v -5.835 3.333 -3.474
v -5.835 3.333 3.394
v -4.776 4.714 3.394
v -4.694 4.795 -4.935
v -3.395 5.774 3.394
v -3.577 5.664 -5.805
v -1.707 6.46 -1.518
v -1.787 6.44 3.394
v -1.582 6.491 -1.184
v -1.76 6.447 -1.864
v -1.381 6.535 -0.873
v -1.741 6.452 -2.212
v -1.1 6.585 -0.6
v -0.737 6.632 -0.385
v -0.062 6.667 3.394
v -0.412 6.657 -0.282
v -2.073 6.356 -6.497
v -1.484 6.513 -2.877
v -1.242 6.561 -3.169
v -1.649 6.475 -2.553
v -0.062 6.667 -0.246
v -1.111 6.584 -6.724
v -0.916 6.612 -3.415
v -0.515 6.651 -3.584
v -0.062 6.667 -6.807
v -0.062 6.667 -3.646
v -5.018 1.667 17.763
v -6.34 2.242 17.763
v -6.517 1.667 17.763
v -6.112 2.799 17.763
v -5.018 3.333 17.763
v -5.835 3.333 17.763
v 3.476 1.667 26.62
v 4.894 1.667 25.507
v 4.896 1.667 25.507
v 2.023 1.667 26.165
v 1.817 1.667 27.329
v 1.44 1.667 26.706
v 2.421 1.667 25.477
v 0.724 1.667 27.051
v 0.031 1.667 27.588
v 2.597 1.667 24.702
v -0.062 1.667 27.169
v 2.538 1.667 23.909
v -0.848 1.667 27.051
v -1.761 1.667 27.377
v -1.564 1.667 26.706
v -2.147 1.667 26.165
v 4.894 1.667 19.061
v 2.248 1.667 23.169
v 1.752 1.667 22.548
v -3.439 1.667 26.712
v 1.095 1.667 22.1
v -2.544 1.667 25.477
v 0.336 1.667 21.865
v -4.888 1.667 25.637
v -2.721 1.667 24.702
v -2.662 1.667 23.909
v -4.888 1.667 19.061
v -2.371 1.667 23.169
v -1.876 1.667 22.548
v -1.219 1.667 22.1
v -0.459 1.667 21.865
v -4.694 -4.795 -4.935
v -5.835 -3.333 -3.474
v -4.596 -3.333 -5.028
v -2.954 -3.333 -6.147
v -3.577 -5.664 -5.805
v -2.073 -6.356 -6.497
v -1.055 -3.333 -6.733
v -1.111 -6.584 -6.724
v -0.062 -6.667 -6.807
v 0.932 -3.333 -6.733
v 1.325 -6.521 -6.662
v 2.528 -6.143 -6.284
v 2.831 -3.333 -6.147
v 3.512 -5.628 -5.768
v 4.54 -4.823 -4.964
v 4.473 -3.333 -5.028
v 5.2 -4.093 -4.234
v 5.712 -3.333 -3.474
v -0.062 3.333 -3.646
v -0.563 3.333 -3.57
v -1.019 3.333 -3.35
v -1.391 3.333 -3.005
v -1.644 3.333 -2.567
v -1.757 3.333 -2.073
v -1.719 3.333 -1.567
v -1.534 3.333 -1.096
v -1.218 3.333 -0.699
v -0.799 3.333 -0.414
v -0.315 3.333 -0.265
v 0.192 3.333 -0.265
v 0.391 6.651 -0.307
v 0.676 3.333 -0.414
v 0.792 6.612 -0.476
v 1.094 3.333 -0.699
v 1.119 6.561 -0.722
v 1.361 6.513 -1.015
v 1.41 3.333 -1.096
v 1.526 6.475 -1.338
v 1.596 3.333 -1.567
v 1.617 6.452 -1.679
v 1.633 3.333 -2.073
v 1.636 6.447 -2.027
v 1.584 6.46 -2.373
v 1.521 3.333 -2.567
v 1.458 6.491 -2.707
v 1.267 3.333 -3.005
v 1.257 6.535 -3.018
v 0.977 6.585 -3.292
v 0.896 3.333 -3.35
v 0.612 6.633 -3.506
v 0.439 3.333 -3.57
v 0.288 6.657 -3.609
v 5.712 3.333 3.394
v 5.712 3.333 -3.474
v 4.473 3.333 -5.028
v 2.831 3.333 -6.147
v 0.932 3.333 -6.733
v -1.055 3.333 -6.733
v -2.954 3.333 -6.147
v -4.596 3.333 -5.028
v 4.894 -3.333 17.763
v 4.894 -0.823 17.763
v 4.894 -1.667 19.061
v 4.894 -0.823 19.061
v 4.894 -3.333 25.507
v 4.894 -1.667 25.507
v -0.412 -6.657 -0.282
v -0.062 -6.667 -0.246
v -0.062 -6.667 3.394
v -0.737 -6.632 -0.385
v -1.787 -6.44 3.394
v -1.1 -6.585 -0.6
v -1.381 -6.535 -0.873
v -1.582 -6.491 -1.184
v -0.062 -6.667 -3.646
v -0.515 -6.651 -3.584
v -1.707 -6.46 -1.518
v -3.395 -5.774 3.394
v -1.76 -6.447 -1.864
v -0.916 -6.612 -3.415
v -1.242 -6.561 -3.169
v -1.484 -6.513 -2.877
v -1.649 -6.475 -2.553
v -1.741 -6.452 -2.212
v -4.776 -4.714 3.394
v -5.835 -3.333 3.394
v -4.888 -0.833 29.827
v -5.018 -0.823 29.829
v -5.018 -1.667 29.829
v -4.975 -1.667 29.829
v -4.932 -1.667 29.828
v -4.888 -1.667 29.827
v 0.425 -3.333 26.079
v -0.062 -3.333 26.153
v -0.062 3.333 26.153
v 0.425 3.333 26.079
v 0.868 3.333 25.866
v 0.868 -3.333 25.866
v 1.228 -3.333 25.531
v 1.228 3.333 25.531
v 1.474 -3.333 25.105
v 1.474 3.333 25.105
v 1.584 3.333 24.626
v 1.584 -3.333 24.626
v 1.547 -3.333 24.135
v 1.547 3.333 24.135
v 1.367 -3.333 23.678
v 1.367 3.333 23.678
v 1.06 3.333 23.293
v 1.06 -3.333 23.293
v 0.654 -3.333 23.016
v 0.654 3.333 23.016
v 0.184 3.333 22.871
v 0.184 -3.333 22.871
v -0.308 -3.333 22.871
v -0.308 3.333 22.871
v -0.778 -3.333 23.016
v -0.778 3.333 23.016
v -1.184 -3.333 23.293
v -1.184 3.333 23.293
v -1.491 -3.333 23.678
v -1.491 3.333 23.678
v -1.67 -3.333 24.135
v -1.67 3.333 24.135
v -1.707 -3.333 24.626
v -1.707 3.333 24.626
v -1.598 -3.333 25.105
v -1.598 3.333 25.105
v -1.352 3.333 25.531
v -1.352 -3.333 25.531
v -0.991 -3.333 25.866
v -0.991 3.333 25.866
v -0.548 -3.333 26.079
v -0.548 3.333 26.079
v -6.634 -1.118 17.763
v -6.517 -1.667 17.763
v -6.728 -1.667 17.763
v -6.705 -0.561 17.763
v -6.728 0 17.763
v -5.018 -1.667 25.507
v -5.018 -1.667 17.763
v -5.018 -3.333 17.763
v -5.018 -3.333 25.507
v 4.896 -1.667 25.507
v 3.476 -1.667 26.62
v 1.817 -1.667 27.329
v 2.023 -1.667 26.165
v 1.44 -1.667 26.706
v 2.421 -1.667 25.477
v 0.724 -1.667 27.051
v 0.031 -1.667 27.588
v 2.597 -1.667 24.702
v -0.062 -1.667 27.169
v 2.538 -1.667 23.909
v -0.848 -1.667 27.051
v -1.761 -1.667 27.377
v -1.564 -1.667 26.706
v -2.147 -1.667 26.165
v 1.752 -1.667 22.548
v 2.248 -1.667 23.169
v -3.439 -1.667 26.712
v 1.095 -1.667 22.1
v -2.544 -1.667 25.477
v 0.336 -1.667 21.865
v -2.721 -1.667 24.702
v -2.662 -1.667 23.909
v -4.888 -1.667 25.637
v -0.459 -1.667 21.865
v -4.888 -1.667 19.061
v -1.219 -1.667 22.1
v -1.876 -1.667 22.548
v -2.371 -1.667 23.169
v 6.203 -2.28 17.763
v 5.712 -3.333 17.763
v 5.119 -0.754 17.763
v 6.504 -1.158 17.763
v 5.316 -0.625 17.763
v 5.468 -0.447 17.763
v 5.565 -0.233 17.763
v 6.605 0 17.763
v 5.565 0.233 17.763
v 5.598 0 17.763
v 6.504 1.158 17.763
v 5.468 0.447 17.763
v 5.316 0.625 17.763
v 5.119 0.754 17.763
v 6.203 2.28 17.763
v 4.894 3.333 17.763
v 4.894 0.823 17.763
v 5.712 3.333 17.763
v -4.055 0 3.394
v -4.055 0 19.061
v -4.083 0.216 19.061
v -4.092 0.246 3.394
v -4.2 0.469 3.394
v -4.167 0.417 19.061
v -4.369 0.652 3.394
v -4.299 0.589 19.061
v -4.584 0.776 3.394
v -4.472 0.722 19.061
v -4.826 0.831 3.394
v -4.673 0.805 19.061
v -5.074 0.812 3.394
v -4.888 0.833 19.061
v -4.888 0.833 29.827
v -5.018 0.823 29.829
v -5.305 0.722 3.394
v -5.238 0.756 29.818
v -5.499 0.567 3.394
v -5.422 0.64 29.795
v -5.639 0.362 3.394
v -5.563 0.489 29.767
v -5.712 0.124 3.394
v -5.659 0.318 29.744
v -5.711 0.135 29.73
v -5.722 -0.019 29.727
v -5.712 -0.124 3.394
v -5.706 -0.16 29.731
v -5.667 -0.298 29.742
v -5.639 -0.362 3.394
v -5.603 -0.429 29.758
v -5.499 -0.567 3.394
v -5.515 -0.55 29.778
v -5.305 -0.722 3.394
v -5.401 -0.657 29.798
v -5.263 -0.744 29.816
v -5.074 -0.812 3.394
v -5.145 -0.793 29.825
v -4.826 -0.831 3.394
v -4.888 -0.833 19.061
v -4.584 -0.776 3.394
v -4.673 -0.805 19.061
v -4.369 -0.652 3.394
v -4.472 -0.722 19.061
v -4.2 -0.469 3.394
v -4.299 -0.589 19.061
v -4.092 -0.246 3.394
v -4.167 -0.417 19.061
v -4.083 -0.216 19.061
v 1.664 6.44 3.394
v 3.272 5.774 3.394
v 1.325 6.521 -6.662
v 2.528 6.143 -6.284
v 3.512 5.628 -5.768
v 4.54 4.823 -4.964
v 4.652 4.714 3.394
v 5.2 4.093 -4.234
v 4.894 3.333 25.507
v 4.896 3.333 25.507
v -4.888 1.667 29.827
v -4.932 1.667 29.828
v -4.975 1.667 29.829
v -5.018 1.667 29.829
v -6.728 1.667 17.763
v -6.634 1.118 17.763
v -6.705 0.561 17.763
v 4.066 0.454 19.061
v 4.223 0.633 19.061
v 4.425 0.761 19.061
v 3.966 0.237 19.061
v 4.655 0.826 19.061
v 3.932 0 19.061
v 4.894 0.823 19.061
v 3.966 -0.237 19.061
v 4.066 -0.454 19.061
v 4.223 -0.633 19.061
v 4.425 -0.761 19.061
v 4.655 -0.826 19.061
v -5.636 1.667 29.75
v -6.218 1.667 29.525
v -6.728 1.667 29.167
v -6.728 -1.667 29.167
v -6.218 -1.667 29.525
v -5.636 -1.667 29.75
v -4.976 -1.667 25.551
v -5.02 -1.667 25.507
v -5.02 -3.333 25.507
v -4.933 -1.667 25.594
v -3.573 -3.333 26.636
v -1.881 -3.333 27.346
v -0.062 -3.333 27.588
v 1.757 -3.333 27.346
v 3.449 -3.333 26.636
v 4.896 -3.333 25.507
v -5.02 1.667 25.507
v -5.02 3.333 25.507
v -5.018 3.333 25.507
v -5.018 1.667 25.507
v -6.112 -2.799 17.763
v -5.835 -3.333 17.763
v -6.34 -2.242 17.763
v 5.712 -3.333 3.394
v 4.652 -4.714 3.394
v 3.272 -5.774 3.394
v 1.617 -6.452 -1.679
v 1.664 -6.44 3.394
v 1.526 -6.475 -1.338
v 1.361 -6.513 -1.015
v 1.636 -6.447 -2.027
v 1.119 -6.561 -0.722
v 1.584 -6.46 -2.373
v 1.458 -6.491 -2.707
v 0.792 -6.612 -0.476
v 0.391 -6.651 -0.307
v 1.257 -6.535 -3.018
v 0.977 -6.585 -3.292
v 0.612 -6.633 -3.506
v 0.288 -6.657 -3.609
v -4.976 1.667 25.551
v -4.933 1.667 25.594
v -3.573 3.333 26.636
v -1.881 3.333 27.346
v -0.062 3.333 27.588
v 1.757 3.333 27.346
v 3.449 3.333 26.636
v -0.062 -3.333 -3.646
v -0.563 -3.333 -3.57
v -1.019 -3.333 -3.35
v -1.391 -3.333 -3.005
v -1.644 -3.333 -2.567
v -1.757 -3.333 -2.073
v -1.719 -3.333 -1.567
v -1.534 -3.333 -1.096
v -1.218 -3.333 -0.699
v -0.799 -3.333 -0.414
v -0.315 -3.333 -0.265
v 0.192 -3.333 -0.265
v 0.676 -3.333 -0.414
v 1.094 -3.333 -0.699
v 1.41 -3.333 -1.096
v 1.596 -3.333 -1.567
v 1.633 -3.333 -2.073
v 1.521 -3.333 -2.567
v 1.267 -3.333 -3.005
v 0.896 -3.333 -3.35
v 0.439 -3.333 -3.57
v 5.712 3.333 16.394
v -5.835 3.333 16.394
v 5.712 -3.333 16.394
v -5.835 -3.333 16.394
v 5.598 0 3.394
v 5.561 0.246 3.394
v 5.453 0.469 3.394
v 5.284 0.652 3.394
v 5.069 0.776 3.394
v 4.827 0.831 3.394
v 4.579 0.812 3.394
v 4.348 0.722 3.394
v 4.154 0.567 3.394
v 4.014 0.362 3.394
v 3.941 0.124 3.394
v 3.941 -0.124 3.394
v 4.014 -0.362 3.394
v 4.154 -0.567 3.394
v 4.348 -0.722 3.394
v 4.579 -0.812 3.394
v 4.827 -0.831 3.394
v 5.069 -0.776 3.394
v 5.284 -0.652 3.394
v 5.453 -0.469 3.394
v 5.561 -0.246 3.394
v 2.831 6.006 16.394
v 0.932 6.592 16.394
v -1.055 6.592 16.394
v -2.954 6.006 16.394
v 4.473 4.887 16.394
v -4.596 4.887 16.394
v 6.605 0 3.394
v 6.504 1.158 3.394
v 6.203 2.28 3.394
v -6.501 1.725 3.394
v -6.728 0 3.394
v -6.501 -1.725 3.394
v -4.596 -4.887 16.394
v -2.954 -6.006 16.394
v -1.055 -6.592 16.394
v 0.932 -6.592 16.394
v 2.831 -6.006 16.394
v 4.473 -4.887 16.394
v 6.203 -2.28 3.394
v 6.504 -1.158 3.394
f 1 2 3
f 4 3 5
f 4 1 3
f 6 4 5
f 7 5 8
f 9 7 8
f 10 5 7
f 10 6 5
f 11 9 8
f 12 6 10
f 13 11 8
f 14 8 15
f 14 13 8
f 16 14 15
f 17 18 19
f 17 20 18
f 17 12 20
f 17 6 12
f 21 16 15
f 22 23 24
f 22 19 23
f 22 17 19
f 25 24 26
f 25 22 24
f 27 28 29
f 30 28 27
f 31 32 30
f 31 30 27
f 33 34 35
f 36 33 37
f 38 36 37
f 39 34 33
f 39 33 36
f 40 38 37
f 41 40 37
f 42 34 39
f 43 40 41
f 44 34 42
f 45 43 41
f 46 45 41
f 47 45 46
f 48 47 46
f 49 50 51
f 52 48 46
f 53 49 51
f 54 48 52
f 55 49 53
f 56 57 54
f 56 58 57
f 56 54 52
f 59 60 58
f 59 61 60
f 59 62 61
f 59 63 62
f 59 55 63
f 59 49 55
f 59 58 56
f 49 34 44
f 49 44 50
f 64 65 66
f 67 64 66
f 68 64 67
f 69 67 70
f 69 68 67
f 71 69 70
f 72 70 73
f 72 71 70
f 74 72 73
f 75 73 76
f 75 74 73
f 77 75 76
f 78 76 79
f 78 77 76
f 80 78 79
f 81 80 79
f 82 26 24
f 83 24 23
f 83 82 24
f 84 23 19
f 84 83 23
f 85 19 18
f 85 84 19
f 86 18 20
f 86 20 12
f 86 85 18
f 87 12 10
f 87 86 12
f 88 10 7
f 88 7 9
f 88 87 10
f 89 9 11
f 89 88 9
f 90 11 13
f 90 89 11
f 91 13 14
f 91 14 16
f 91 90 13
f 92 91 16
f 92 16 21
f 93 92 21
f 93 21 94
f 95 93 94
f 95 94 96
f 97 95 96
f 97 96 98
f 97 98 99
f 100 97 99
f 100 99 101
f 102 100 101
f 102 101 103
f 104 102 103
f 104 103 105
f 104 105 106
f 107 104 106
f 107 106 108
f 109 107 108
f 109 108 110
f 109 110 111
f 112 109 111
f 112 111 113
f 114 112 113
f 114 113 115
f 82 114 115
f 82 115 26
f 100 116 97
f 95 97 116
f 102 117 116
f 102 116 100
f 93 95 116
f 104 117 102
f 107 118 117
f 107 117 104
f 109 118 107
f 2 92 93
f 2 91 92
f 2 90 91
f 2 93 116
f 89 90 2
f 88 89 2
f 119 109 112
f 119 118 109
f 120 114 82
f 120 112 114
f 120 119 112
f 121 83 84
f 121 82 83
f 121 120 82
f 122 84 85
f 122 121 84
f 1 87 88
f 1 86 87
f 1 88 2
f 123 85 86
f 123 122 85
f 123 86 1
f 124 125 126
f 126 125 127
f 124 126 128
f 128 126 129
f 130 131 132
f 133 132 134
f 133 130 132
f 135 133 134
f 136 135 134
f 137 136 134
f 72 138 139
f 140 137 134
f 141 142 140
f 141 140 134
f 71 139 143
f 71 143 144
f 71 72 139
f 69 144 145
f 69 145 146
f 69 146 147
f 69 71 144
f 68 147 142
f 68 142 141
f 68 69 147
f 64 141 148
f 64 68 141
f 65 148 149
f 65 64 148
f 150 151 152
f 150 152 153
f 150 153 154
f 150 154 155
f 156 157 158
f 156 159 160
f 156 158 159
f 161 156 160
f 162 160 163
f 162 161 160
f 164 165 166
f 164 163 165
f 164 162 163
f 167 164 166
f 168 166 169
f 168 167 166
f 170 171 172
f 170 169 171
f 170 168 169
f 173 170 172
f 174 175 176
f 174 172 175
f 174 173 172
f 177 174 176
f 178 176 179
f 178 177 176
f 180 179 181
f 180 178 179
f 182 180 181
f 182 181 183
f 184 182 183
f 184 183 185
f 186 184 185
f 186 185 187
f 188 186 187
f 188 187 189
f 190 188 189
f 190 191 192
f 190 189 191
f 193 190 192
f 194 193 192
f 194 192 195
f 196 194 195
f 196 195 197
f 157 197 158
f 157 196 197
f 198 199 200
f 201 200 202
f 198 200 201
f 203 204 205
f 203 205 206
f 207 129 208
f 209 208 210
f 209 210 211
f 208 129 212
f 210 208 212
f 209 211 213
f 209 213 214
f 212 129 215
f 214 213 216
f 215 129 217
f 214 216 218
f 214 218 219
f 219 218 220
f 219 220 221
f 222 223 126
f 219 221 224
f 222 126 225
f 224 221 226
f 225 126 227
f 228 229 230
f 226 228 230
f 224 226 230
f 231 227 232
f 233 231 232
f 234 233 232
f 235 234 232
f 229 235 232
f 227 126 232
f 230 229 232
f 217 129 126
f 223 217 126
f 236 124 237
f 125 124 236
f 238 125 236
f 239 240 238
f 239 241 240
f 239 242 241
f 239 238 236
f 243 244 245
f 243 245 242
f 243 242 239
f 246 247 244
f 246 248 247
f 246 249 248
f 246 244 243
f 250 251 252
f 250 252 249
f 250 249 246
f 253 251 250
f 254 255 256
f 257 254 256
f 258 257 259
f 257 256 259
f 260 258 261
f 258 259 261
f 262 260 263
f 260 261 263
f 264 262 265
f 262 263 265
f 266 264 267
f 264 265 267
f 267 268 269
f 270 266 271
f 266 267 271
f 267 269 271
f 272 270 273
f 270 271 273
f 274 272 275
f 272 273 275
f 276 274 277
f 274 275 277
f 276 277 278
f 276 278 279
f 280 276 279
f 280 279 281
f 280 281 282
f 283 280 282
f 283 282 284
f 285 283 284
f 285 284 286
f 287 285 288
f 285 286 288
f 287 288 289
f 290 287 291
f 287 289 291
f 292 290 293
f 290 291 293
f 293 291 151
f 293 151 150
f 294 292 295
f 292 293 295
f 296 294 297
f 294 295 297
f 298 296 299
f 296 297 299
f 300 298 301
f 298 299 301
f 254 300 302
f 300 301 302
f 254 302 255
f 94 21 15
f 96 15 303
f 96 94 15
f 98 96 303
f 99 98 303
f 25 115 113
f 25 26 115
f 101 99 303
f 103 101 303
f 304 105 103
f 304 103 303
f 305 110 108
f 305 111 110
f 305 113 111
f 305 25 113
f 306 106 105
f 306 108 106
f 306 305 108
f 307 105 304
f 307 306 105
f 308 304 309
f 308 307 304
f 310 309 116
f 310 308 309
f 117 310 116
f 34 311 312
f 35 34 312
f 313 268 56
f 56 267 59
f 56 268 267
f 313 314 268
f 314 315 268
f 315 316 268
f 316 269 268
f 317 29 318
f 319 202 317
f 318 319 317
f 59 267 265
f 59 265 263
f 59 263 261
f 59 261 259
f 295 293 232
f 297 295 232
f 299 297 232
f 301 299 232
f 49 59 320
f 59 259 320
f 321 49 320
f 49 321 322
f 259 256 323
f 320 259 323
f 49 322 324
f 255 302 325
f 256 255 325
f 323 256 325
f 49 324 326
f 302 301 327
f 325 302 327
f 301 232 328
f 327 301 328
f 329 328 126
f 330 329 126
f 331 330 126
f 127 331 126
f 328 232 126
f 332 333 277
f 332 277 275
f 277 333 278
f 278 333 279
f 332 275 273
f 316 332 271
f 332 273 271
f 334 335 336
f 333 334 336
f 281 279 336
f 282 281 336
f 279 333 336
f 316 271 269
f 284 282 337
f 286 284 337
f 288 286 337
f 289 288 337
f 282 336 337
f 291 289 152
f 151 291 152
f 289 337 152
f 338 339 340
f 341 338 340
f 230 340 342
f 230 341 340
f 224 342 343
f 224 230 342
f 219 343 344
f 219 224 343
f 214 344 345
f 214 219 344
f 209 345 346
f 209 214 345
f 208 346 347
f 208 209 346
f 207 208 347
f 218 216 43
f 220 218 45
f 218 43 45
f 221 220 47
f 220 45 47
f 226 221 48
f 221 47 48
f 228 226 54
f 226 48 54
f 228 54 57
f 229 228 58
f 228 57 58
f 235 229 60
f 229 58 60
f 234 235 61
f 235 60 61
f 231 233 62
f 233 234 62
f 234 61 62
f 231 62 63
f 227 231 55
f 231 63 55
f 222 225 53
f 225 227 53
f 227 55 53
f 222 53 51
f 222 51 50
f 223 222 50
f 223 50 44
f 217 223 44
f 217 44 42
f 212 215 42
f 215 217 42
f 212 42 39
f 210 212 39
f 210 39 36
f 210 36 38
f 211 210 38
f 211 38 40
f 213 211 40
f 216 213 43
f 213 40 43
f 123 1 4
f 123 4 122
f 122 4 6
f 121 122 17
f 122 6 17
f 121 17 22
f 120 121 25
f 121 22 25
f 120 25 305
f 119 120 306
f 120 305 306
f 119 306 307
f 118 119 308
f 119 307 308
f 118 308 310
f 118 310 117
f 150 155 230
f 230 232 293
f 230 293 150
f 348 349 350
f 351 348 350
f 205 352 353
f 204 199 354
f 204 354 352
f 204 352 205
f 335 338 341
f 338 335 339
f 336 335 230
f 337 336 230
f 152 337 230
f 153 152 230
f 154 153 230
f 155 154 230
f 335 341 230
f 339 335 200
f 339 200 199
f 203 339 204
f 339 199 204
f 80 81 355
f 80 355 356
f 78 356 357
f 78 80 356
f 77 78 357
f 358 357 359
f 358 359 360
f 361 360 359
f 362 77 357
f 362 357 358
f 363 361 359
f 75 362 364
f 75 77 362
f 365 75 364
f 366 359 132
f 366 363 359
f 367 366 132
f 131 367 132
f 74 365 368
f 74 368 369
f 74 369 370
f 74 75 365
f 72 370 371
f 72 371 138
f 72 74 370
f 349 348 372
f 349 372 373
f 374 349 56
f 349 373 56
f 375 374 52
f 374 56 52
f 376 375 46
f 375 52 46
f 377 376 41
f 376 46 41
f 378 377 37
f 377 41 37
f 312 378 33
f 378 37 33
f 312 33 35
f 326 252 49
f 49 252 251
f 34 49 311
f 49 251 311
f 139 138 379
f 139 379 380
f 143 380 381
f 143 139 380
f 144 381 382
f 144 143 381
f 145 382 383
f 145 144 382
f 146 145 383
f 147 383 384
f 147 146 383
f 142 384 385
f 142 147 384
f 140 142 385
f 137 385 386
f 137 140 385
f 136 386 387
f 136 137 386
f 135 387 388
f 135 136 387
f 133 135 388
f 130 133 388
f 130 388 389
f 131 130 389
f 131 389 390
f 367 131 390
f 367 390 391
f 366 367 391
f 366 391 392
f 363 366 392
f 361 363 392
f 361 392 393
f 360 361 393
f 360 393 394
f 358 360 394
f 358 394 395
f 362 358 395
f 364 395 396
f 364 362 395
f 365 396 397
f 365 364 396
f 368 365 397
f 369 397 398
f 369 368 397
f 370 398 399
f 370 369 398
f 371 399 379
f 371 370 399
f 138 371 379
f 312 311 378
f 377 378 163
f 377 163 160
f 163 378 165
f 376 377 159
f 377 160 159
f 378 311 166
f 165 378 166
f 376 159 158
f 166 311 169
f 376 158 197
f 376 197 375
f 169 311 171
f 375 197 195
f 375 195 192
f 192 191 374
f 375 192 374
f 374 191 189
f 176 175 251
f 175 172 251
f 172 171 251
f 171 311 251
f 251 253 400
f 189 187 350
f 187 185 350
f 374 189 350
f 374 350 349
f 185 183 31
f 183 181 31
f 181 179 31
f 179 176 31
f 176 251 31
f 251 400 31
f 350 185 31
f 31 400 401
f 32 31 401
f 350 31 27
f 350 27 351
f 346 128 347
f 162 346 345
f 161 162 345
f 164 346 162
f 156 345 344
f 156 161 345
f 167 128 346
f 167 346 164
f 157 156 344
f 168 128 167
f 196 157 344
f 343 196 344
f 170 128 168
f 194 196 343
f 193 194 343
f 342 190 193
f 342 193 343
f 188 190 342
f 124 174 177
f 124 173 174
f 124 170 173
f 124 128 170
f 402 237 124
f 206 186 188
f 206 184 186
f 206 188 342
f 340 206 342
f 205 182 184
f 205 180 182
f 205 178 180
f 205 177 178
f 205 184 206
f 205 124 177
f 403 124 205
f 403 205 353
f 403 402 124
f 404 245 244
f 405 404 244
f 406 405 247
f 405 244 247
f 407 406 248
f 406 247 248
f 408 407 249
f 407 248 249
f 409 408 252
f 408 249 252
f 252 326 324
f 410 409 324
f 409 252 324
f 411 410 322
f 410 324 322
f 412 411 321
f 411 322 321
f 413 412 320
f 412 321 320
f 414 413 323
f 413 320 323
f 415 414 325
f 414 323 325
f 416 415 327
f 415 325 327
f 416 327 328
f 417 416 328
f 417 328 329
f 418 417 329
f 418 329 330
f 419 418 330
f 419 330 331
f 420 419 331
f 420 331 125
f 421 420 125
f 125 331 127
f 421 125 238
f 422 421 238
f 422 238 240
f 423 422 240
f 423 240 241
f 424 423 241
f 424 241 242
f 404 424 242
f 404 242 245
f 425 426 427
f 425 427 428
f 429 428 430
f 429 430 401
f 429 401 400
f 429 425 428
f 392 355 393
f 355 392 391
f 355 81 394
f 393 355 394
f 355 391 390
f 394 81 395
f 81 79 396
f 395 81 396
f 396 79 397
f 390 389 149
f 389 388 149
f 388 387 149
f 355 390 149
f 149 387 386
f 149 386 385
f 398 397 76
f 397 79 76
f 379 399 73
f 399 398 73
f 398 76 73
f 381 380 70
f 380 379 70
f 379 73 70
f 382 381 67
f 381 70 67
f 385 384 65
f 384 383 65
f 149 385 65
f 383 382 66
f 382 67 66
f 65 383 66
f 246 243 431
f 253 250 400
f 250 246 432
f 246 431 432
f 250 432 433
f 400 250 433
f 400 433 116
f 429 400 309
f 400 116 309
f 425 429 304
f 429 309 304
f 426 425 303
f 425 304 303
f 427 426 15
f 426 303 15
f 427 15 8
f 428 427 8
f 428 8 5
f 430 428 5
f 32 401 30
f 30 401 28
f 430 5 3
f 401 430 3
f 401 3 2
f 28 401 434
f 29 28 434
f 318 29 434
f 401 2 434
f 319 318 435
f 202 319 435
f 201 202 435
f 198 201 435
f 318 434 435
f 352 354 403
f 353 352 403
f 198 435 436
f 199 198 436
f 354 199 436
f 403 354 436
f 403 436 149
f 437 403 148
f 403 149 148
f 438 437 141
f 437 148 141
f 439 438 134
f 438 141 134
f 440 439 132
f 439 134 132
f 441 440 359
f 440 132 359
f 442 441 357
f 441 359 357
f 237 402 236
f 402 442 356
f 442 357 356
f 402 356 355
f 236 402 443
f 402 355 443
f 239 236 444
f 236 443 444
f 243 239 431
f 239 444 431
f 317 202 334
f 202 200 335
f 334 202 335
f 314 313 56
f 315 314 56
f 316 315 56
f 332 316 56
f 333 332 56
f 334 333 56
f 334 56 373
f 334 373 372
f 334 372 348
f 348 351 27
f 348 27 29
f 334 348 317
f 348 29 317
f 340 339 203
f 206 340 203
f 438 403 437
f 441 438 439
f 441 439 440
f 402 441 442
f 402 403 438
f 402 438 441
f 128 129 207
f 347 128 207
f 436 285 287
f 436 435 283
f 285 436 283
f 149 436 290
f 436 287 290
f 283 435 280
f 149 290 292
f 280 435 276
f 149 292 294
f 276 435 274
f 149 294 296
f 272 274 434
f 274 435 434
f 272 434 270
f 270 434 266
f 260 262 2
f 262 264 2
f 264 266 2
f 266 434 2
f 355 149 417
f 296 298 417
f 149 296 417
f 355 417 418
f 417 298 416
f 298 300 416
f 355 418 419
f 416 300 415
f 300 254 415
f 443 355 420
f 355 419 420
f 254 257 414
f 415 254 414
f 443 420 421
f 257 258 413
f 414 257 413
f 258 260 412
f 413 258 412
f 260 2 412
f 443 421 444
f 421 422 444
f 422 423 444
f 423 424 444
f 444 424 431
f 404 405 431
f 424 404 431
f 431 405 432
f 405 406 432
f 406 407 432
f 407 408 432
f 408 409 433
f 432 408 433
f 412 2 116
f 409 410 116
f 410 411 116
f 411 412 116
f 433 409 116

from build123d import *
from build123d.topology import SkipClean

# Parameters (mm, degrees)
SKETCH2_R                       = 10
PHALANGE_LENGTH_DEPTH           = 23.5
BOSS_EXTRUDE3_DEPTH             = 5
BOSS_EXTRUDE4_DEPTH             = 5
BOSS_EXTRUDE4_DEPTH_BACK        = 5
CUT_EXTRUDE2_START              = -15.3025
CUT_EXTRUDE2_DEPTH              = 15.3025
SKETCH7_R                       = 1.65
CUT_EXTRUDE3_DEPTH              = 10
CUT_EXTRUDE4_DEPTH              = 2.5
CUT_EXTRUDE4_DEPTH_BACK         = 2.5
CUT_EXTRUDE7_REACH              = 44.831
SKETCH4_R                       = 1.65
CUT_EXTRUDE7_DIRECTION_2_REACH  = 44.831
CUT_EXTRUDE_THIN1_START         = 23.5
CUT_EXTRUDE_THIN1_DEPTH         = 10.361670454
BOSS_EXTRUDE5_REACH             = 44.021
SKETCH9_R                       = 4
SKETCH9_R_2                     = 1.65
CUT_EXTRUDE8_REACH              = 43.299
SKETCH10_R                      = 1.25
CUT_EXTRUDE9_START              = -4
CUT_EXTRUDE9_DEPTH              = 4
CUT_EXTRUDE10_REACH             = 44.021
CUT_EXTRUDE10_DIRECTION_2_REACH = 44.021
CUT_EXTRUDE11_START             = -10
CUT_EXTRUDE11_OUTLINE_W         = 2.565773848
CUT_EXTRUDE11_OUTLINE_H         = 11.6166929
CUT_EXTRUDE11_DEPTH             = 10
BOSS_EXTRUDE7_REACH             = 41.664
CUT_EXTRUDE12_REACH             = 43.299
SKETCH10_2_R                    = 1.25
CUT_EXTRUDE12_DIRECTION_2_REACH = 43.299
SKETCH17_R                      = 1.25
SKETCH17_W                      = 2.42123439
SKETCH17_H                      = 5
CUT_EXTRUDE14_DEPTH             = 16.148519
SCALE1_SCALE                    = 0.666666667
CUT_EXTRUDE15_START             = -10
SKETCH18_R                      = 1.65
CUT_EXTRUDE15_DEPTH             = 13.333338
CUT_EXTRUDE16_START             = -3.333333
SKETCH19_R                      = 1.7
CUT_EXTRUDE16_DEPTH             = 13.333338


# Read off the part's stored shape, not the designer's step: Cut-Extrude-Thin1, Cut-Extrude11
with BuildPart() as part:
    # Sketch2 → Phalange Length (new body)
    with BuildSketch(Plane.XY):
        Circle(SKETCH2_R)
    extrude(amount=PHALANGE_LENGTH_DEPTH)

    # Sketch3 → Boss-Extrude3 (add)
    with BuildSketch(Plane(origin=(0, -10, 0), x_dir=(-1, 0, 0), z_dir=(0, -1, 0))):
        with BuildLine():
            Line((-10, 5.302499701), (-10, 0))
            Line((-10, 0), (10, 0))
            Line((10, 0), (10, 5.302499701))
            ThreePointArc((10, 5.302499701), (0, 15.302499701), (-10, 5.302499701))
        make_face()
    boss_extrude3 = extrude(amount=-BOSS_EXTRUDE3_DEPTH)

    # Mirror1: Boss-Extrude3 across plane
    add(boss_extrude3.mirror(Plane.ZX))

    # Sketch5 → Boss-Extrude4 (add, two sides: drawn at the far end of the back side and taken through both)
    with BuildSketch(Plane(origin=(0, 0, 0), x_dir=(1, 0, 0), z_dir=(0, 1, 0)).offset(-BOSS_EXTRUDE4_DEPTH_BACK)):
        with BuildLine():
            Line((-10, -29.283157911), (-10, -23.5))
            Line((-10, -23.5), (10, -23.5))
            Line((10, -23.5), (10, -29.283157911))
            ThreePointArc((10, -29.283157911), (0, -38.851984156), (-10, -29.283157911))
        make_face()
    extrude(amount=BOSS_EXTRUDE4_DEPTH + BOSS_EXTRUDE4_DEPTH_BACK)

    # Sketch6 → Cut-Extrude2 (cut)
    with SkipClean():  # the faces are left unmerged after this step: merging them gives an invalid solid
        with BuildSketch(Plane.XY.offset(CUT_EXTRUDE2_START)):
            with BuildLine():
                ThreePointArc((0, 10), (5, 8.660254038), (8.660254038, 5))
                Line((8.660254038, 5), (10, 5))
                Line((10, 5), (10, 10))
                Line((10, 10), (0, 10))
            make_face()
            with BuildLine():
                Line((10, -5), (8.660254038, -5))
                ThreePointArc((8.660254038, -5), (5, -8.660254038), (0, -10))
                Line((0, -10), (10, -10))
                Line((10, -10), (10, -5))
            make_face()
            with BuildLine():
                ThreePointArc((-8.660254038, 5), (-5, 8.660254038), (0, 10))
                Line((0, 10), (-10, 10))
                Line((-10, 10), (-10, 5))
                Line((-10, 5), (-8.660254038, 5))
            make_face()
            with BuildLine():
                Line((-10, -10), (0, -10))
                ThreePointArc((0, -10), (-5, -8.660254038), (-8.660254038, -5))
                Line((-8.660254038, -5), (-10, -5))
                Line((-10, -5), (-10, -10))
            make_face()
        extrude(amount=CUT_EXTRUDE2_DEPTH, mode=Mode.SUBTRACT)

    # Sketch7 → Cut-Extrude3 (cut)
    with SkipClean():  # the faces are left unmerged after this step: merging them gives an invalid solid
        with BuildSketch(Plane(origin=(0, 5, 0), x_dir=(1, 0, 0), z_dir=(0, 1, 0))):
            with Locations(Location((0, -31.661984156, 0), (0, 0, 270))):
                Circle(SKETCH7_R)
        extrude(amount=-CUT_EXTRUDE3_DEPTH, mode=Mode.SUBTRACT)

    # Sketch5<2> → Cut-Extrude4 (cut, two sides: drawn at the far end of the back side and taken through both)
    with BuildSketch(Plane(origin=(0, 0, 0), x_dir=(1, 0, 0), z_dir=(0, 1, 0)).offset(-CUT_EXTRUDE4_DEPTH_BACK)):
        with BuildLine():
            Line((-10, -29.283157911), (-10, -23.5))
            Line((-10, -23.5), (10, -23.5))
            Line((10, -23.5), (10, -29.283157911))
            ThreePointArc((10, -29.283157911), (0, -38.851984156), (-10, -29.283157911))
        make_face()
    extrude(amount=CUT_EXTRUDE4_DEPTH + CUT_EXTRUDE4_DEPTH_BACK, mode=Mode.SUBTRACT)

    # Sketch4 → Cut-Extrude7 (cut, up to next)
    with BuildSketch(Plane(origin=(0, -5, 0), x_dir=(1, 0, 0), z_dir=(0, 1, 0)), mode=Mode.PRIVATE) as cut_extrude7_sk1:
        with Locations(Location((0, 8.010159673, 0), (0, 0, 270))):
            Circle(SKETCH4_R)
    cut_extrude7_tool1 = extrude(cut_extrude7_sk1.sketch, amount=-CUT_EXTRUDE7_REACH, mode=Mode.PRIVATE) & part.part
    add(cut_extrude7_tool1.solids().sort_by_distance((0, -5, -8.01016))[0], mode=Mode.SUBTRACT)

    # Sketch4 → Cut-Extrude7 direction 2 (cut, up to next)
    with BuildSketch(Plane(origin=(0, -5, 0), x_dir=(1, 0, 0), z_dir=(0, 1, 0)), mode=Mode.PRIVATE) as cut_extrude7_direction_2_sk1:
        with Locations(Location((0, 8.010159673, 0), (0, 0, 270))):
            Circle(SKETCH4_R)
    cut_extrude7_direction_2_tool1 = extrude(cut_extrude7_direction_2_sk1.sketch, amount=CUT_EXTRUDE7_DIRECTION_2_REACH, mode=Mode.PRIVATE) & part.part
    add(cut_extrude7_direction_2_tool1.solids().sort_by_distance((0, -5, -8.01016))[0], mode=Mode.SUBTRACT)

    # Cut-Extrude-Thin1 outline → Cut-Extrude-Thin1 (cut)
    with SkipClean():  # the faces are left unmerged after this step: merging them gives an invalid solid
        with BuildSketch(Plane.XY.offset(CUT_EXTRUDE_THIN1_START)):
            with BuildLine():
                ThreePointArc((8.660254038, 5), (9.256147934, 3.78466979), (9.682458366, 2.5))
                Line((9.682458366, 2.5), (10, 2.5))
                Line((10, 2.5), (10, 5))
                Line((10, 5), (8.660254038, 5))
            make_face()
            with BuildLine():
                Line((10, -2.5), (9.682458366, -2.5))
                ThreePointArc((9.682458366, -2.5), (9.256147934, -3.78466979), (8.660254038, -5))
                Line((8.660254038, -5), (10, -5))
                Line((10, -5), (10, -2.5))
            make_face()
            with BuildLine():
                Line((-10, 2.5), (-9.682458366, 2.5))
                ThreePointArc((-9.682458366, 2.5), (-9.256147934, 3.78466979), (-8.660254038, 5))
                Line((-8.660254038, 5), (-10, 5))
                Line((-10, 5), (-10, 2.5))
            make_face()
            with BuildLine():
                ThreePointArc((-8.660254038, -5), (-9.256147934, -3.78466979), (-9.682458366, -2.5))
                Line((-9.682458366, -2.5), (-10, -2.5))
                Line((-10, -2.5), (-10, -5))
                Line((-10, -5), (-8.660254038, -5))
            make_face()
        extrude(amount=CUT_EXTRUDE_THIN1_DEPTH, mode=Mode.SUBTRACT)

    # Sketch9 → Boss-Extrude5 (add, up to next)
    with BuildSketch(Plane.XZ.offset(-2.5), mode=Mode.PRIVATE) as boss_extrude5_sk1:
        with Locations(Location((0, 31.661984156, 0), (0, 0, 90))):
            Circle(SKETCH9_R)
        with Locations(Location((0, 31.661984156, 0), (0, 0, 90))):
            Circle(SKETCH9_R_2, mode=Mode.SUBTRACT)
    boss_extrude5_tool1 = extrude(boss_extrude5_sk1.sketch, amount=BOSS_EXTRUDE5_REACH, mode=Mode.PRIVATE) - part.part
    add(boss_extrude5_tool1.solids().sort_by_distance((0, 2.5, 27.775121))[0])

    # Sketch10 → Cut-Extrude8 (cut, up to next)
    with BuildSketch(Plane.XY.offset(23.5), mode=Mode.PRIVATE) as cut_extrude8_sk1:
        with Locations((7.239961745, 0)):
            Circle(SKETCH10_R)
    cut_extrude8_tool1 = extrude(cut_extrude8_sk1.sketch, amount=-CUT_EXTRUDE8_REACH, mode=Mode.PRIVATE) & part.part
    # Sketch10 → Cut-Extrude8 (cut, up to next)
    with BuildSketch(Plane.XY.offset(23.5), mode=Mode.PRIVATE) as cut_extrude8_sk2:
        with Locations((-7.239961745, 0)):
            Circle(SKETCH10_R)
    cut_extrude8_tool2 = extrude(cut_extrude8_sk2.sketch, amount=-CUT_EXTRUDE8_REACH, mode=Mode.PRIVATE) & part.part
    add(cut_extrude8_tool1.solids().sort_by_distance((7.239962, 0, 23.5))[0], mode=Mode.SUBTRACT)
    add(cut_extrude8_tool2.solids().sort_by_distance((-7.239962, 0, 23.5))[0], mode=Mode.SUBTRACT)

    # Sketch11 → Cut-Extrude9 (cut)
    with SkipClean():  # the faces are left unmerged after this step: merging them gives an invalid solid
        with BuildSketch(Plane.XY.offset(23.5).offset(CUT_EXTRUDE9_START)):
            with BuildLine():
                ThreePointArc((8.660254038, 5), (0, 10), (-8.660254038, 5))
                Line((-8.660254038, 5), (8.660254038, 5))
            make_face()
            with BuildLine():
                Line((8.660254038, -5), (-8.660254038, -5))
                ThreePointArc((-8.660254038, -5), (0, -10), (8.660254038, -5))
            make_face()
        extrude(amount=CUT_EXTRUDE9_DEPTH, mode=Mode.SUBTRACT)

    # Sketch12 → Cut-Extrude10 (cut, up to next)
    with BuildSketch(Plane.XZ.offset(-2.5), mode=Mode.PRIVATE) as cut_extrude10_sk1:
        with BuildLine():
            Line((-10.033719202, 38.851984156), (-10.033719202, 31.664892021))
            Line((-10.033719202, 31.664892021), (-8.660254038, 31.664892021))
            ThreePointArc((-8.660254038, 31.664892021), (0, 36.290740593), (8.660254038, 31.664892021))
            Line((8.660254038, 31.664892021), (10.033719202, 31.664892021))
            Line((10.033719202, 31.664892021), (10.033719202, 38.851984156))
            Line((10.033719202, 38.851984156), (-10.033719202, 38.851984156))
        make_face()
    cut_extrude10_tool1 = extrude(cut_extrude10_sk1.sketch, amount=CUT_EXTRUDE10_REACH, mode=Mode.PRIVATE) & part.part
    add(cut_extrude10_tool1.solids().sort_by_distance((0, 2.5, 36.350279))[0], mode=Mode.SUBTRACT)

    # Sketch12 → Cut-Extrude10 direction 2 (cut, up to next)
    with BuildSketch(Plane.XZ.offset(-2.5), mode=Mode.PRIVATE) as cut_extrude10_direction_2_sk1:
        with BuildLine():
            Line((-10.033719202, 38.851984156), (-10.033719202, 31.664892021))
            Line((-10.033719202, 31.664892021), (-8.660254038, 31.664892021))
            ThreePointArc((-8.660254038, 31.664892021), (0, 36.290740593), (8.660254038, 31.664892021))
            Line((8.660254038, 31.664892021), (10.033719202, 31.664892021))
            Line((10.033719202, 31.664892021), (10.033719202, 38.851984156))
            Line((10.033719202, 38.851984156), (-10.033719202, 38.851984156))
        make_face()
    cut_extrude10_direction_2_tool1 = extrude(cut_extrude10_direction_2_sk1.sketch, amount=-CUT_EXTRUDE10_DIRECTION_2_REACH, mode=Mode.PRIVATE) & part.part
    add(cut_extrude10_direction_2_tool1.solids().sort_by_distance((0, 2.5, 36.350279))[0], mode=Mode.SUBTRACT)

    # Cut-Extrude11 outline → Cut-Extrude11 (cut)
    with BuildSketch(Plane.XZ.offset(5).offset(CUT_EXTRUDE11_START)):
        with Locations((-8.717113076, 27.360571369)):
            Rectangle(CUT_EXTRUDE11_OUTLINE_W, CUT_EXTRUDE11_OUTLINE_H)
        with Locations((8.717113076, 27.360571369)):
            Rectangle(CUT_EXTRUDE11_OUTLINE_W, CUT_EXTRUDE11_OUTLINE_H)
    extrude(amount=CUT_EXTRUDE11_DEPTH, mode=Mode.SUBTRACT)

    # Boss-Extrude7: up to this face of the body (flat: up to its plane)
    boss_extrude7_end = Plane(part.part.faces().sort_by_distance((0, 2.5, 23.696174341))[0])
    # Sketch16 → Boss-Extrude7 (add, up to the picked face)
    with BuildSketch(Plane(origin=(0, -2.5, 0), x_dir=(1, 0, 0), z_dir=(0, 1, 0)), mode=Mode.PRIVATE) as boss_extrude7_sk1:
        with BuildLine():
            Line((-4.818727355, -21.552224919), (-7.434226152, -21.552224919))
            Line((-7.434226152, -21.552224919), (-10, -21.552224919))
            Line((-10, -21.552224919), (-10, -38.658561033))
            ThreePointArc((-10, -38.658561033), (-8.808295471, -39.390817912), (-7.43422564, -39.652145139))
            ThreePointArc((-7.43422564, -39.652145139), (-6.033645007, -39.399721533), (-4.818727355, -38.658561033))
            Line((-4.818727355, -38.658561033), (-4.818727355, -35.109527951))
            ThreePointArc((-4.818727355, -35.109527951), (-6.204248493, -34.242230104), (-7.437080645, -33.168917819))
            Line((-7.437080645, -33.168917819), (-7.434226152, -33.168917819))
            Line((-7.434226152, -33.168917819), (-7.434226152, -23.5))
            Line((-7.434226152, -23.5), (-4.818727355, -23.5))
            Line((-4.818727355, -23.5), (-4.818727355, -21.552224919))
        make_face()
    boss_extrude7_tool1 = split(extrude(boss_extrude7_sk1.sketch, amount=BOSS_EXTRUDE7_REACH, mode=Mode.PRIVATE), bisect_by=boss_extrude7_end, keep=Keep.BOTH, mode=Mode.PRIVATE)
    # Sketch16 → Boss-Extrude7 (add, up to the picked face)
    with BuildSketch(Plane(origin=(0, -2.5, 0), x_dir=(1, 0, 0), z_dir=(0, 1, 0)), mode=Mode.PRIVATE) as boss_extrude7_sk2:
        with BuildLine():
            Line((-4.818727355, -35.109527951), (-4.818727355, -23.5))
            Line((-4.818727355, -23.5), (-7.434226152, -23.5))
            Line((-7.434226152, -23.5), (-7.434226152, -33.168917819))
            Line((-7.434226152, -33.168917819), (-7.437080645, -33.168917819))
            ThreePointArc((-7.437080645, -33.168917819), (-6.204248493, -34.242230104), (-4.818727355, -35.109527951))
        make_face()
    boss_extrude7_tool2 = split(extrude(boss_extrude7_sk2.sketch, amount=BOSS_EXTRUDE7_REACH, mode=Mode.PRIVATE), bisect_by=boss_extrude7_end, keep=Keep.BOTH, mode=Mode.PRIVATE)
    add(boss_extrude7_tool1.solids().sort_by(Axis((-7.989429, -2.5, 31.133344), (0, 1, 0)))[0])
    add(boss_extrude7_tool2.solids().sort_by(Axis((-6.08748, -2.5, 28.8879), (0, 1, 0)))[0])

    # Sketch10<2> → Cut-Extrude12 (cut, up to next)
    with BuildSketch(Plane.XY.offset(23.5), mode=Mode.PRIVATE) as cut_extrude12_sk1:
        with Locations((-7.239961745, 0)):
            Circle(SKETCH10_2_R)
    cut_extrude12_tool1 = extrude(cut_extrude12_sk1.sketch, amount=CUT_EXTRUDE12_REACH, mode=Mode.PRIVATE) & part.part
    add(cut_extrude12_tool1.solids().sort_by_distance((-7.239962, 0, 23.5))[0], mode=Mode.SUBTRACT)

    # Sketch10<2> → Cut-Extrude12 direction 2 (cut, up to next)
    with BuildSketch(Plane.XY.offset(23.5), mode=Mode.PRIVATE) as cut_extrude12_direction_2_sk1:
        with Locations((-7.239961745, 0)):
            Circle(SKETCH10_2_R)
    cut_extrude12_direction_2_tool1 = extrude(cut_extrude12_direction_2_sk1.sketch, amount=-CUT_EXTRUDE12_DIRECTION_2_REACH, mode=Mode.PRIVATE) & part.part
    add(cut_extrude12_direction_2_tool1.solids().sort_by_distance((-7.239962, 0, 23.5))[0], mode=Mode.SUBTRACT)

    # Sketch17 → Cut-Extrude14 (cut)
    with SkipClean():  # the faces are left unmerged after this step: merging them gives an invalid solid
        with BuildSketch(Plane.XY.offset(23.5)):
            with Locations((-7.239961745, 0)):
                Circle(SKETCH17_R)
            with Locations((-6.02934455, 0)):
                Rectangle(SKETCH17_W, SKETCH17_H)
        extrude(amount=CUT_EXTRUDE14_DEPTH, mode=Mode.SUBTRACT)


with BuildPart() as part_1:
    # Scale1: scaled about (-0.185364754, -1.7e-07, 10.183125928)
    add(part.part.scale(SCALE1_SCALE).moved(Location((-0.061788251, -5.7e-08, 3.394375309))))

    # Sketch18 → Cut-Extrude15 (cut)
    with BuildSketch(Plane(origin=(0, 3.333328693, 0), x_dir=(1, 0, 0), z_dir=(0, 1, 0)).offset(CUT_EXTRUDE15_START)):
        with Locations(Location((-0.061797352, -24.502530762, 0), (0, 0, 270))):
            Circle(SKETCH18_R)
    extrude(amount=CUT_EXTRUDE15_DEPTH, mode=Mode.SUBTRACT)

    # Sketch19 → Cut-Extrude16 (cut)
    with BuildSketch(Plane(origin=(0, -3.333337974, 0), x_dir=(1, 0, 0), z_dir=(0, 1, 0)).offset(CUT_EXTRUDE16_START)):
        with Locations(Location((-0.061797352, 1.945565124, 0), (0, 0, 90))):
            Circle(SKETCH19_R)
    extrude(amount=CUT_EXTRUDE16_DEPTH, mode=Mode.SUBTRACT)


solid = part_1.part
